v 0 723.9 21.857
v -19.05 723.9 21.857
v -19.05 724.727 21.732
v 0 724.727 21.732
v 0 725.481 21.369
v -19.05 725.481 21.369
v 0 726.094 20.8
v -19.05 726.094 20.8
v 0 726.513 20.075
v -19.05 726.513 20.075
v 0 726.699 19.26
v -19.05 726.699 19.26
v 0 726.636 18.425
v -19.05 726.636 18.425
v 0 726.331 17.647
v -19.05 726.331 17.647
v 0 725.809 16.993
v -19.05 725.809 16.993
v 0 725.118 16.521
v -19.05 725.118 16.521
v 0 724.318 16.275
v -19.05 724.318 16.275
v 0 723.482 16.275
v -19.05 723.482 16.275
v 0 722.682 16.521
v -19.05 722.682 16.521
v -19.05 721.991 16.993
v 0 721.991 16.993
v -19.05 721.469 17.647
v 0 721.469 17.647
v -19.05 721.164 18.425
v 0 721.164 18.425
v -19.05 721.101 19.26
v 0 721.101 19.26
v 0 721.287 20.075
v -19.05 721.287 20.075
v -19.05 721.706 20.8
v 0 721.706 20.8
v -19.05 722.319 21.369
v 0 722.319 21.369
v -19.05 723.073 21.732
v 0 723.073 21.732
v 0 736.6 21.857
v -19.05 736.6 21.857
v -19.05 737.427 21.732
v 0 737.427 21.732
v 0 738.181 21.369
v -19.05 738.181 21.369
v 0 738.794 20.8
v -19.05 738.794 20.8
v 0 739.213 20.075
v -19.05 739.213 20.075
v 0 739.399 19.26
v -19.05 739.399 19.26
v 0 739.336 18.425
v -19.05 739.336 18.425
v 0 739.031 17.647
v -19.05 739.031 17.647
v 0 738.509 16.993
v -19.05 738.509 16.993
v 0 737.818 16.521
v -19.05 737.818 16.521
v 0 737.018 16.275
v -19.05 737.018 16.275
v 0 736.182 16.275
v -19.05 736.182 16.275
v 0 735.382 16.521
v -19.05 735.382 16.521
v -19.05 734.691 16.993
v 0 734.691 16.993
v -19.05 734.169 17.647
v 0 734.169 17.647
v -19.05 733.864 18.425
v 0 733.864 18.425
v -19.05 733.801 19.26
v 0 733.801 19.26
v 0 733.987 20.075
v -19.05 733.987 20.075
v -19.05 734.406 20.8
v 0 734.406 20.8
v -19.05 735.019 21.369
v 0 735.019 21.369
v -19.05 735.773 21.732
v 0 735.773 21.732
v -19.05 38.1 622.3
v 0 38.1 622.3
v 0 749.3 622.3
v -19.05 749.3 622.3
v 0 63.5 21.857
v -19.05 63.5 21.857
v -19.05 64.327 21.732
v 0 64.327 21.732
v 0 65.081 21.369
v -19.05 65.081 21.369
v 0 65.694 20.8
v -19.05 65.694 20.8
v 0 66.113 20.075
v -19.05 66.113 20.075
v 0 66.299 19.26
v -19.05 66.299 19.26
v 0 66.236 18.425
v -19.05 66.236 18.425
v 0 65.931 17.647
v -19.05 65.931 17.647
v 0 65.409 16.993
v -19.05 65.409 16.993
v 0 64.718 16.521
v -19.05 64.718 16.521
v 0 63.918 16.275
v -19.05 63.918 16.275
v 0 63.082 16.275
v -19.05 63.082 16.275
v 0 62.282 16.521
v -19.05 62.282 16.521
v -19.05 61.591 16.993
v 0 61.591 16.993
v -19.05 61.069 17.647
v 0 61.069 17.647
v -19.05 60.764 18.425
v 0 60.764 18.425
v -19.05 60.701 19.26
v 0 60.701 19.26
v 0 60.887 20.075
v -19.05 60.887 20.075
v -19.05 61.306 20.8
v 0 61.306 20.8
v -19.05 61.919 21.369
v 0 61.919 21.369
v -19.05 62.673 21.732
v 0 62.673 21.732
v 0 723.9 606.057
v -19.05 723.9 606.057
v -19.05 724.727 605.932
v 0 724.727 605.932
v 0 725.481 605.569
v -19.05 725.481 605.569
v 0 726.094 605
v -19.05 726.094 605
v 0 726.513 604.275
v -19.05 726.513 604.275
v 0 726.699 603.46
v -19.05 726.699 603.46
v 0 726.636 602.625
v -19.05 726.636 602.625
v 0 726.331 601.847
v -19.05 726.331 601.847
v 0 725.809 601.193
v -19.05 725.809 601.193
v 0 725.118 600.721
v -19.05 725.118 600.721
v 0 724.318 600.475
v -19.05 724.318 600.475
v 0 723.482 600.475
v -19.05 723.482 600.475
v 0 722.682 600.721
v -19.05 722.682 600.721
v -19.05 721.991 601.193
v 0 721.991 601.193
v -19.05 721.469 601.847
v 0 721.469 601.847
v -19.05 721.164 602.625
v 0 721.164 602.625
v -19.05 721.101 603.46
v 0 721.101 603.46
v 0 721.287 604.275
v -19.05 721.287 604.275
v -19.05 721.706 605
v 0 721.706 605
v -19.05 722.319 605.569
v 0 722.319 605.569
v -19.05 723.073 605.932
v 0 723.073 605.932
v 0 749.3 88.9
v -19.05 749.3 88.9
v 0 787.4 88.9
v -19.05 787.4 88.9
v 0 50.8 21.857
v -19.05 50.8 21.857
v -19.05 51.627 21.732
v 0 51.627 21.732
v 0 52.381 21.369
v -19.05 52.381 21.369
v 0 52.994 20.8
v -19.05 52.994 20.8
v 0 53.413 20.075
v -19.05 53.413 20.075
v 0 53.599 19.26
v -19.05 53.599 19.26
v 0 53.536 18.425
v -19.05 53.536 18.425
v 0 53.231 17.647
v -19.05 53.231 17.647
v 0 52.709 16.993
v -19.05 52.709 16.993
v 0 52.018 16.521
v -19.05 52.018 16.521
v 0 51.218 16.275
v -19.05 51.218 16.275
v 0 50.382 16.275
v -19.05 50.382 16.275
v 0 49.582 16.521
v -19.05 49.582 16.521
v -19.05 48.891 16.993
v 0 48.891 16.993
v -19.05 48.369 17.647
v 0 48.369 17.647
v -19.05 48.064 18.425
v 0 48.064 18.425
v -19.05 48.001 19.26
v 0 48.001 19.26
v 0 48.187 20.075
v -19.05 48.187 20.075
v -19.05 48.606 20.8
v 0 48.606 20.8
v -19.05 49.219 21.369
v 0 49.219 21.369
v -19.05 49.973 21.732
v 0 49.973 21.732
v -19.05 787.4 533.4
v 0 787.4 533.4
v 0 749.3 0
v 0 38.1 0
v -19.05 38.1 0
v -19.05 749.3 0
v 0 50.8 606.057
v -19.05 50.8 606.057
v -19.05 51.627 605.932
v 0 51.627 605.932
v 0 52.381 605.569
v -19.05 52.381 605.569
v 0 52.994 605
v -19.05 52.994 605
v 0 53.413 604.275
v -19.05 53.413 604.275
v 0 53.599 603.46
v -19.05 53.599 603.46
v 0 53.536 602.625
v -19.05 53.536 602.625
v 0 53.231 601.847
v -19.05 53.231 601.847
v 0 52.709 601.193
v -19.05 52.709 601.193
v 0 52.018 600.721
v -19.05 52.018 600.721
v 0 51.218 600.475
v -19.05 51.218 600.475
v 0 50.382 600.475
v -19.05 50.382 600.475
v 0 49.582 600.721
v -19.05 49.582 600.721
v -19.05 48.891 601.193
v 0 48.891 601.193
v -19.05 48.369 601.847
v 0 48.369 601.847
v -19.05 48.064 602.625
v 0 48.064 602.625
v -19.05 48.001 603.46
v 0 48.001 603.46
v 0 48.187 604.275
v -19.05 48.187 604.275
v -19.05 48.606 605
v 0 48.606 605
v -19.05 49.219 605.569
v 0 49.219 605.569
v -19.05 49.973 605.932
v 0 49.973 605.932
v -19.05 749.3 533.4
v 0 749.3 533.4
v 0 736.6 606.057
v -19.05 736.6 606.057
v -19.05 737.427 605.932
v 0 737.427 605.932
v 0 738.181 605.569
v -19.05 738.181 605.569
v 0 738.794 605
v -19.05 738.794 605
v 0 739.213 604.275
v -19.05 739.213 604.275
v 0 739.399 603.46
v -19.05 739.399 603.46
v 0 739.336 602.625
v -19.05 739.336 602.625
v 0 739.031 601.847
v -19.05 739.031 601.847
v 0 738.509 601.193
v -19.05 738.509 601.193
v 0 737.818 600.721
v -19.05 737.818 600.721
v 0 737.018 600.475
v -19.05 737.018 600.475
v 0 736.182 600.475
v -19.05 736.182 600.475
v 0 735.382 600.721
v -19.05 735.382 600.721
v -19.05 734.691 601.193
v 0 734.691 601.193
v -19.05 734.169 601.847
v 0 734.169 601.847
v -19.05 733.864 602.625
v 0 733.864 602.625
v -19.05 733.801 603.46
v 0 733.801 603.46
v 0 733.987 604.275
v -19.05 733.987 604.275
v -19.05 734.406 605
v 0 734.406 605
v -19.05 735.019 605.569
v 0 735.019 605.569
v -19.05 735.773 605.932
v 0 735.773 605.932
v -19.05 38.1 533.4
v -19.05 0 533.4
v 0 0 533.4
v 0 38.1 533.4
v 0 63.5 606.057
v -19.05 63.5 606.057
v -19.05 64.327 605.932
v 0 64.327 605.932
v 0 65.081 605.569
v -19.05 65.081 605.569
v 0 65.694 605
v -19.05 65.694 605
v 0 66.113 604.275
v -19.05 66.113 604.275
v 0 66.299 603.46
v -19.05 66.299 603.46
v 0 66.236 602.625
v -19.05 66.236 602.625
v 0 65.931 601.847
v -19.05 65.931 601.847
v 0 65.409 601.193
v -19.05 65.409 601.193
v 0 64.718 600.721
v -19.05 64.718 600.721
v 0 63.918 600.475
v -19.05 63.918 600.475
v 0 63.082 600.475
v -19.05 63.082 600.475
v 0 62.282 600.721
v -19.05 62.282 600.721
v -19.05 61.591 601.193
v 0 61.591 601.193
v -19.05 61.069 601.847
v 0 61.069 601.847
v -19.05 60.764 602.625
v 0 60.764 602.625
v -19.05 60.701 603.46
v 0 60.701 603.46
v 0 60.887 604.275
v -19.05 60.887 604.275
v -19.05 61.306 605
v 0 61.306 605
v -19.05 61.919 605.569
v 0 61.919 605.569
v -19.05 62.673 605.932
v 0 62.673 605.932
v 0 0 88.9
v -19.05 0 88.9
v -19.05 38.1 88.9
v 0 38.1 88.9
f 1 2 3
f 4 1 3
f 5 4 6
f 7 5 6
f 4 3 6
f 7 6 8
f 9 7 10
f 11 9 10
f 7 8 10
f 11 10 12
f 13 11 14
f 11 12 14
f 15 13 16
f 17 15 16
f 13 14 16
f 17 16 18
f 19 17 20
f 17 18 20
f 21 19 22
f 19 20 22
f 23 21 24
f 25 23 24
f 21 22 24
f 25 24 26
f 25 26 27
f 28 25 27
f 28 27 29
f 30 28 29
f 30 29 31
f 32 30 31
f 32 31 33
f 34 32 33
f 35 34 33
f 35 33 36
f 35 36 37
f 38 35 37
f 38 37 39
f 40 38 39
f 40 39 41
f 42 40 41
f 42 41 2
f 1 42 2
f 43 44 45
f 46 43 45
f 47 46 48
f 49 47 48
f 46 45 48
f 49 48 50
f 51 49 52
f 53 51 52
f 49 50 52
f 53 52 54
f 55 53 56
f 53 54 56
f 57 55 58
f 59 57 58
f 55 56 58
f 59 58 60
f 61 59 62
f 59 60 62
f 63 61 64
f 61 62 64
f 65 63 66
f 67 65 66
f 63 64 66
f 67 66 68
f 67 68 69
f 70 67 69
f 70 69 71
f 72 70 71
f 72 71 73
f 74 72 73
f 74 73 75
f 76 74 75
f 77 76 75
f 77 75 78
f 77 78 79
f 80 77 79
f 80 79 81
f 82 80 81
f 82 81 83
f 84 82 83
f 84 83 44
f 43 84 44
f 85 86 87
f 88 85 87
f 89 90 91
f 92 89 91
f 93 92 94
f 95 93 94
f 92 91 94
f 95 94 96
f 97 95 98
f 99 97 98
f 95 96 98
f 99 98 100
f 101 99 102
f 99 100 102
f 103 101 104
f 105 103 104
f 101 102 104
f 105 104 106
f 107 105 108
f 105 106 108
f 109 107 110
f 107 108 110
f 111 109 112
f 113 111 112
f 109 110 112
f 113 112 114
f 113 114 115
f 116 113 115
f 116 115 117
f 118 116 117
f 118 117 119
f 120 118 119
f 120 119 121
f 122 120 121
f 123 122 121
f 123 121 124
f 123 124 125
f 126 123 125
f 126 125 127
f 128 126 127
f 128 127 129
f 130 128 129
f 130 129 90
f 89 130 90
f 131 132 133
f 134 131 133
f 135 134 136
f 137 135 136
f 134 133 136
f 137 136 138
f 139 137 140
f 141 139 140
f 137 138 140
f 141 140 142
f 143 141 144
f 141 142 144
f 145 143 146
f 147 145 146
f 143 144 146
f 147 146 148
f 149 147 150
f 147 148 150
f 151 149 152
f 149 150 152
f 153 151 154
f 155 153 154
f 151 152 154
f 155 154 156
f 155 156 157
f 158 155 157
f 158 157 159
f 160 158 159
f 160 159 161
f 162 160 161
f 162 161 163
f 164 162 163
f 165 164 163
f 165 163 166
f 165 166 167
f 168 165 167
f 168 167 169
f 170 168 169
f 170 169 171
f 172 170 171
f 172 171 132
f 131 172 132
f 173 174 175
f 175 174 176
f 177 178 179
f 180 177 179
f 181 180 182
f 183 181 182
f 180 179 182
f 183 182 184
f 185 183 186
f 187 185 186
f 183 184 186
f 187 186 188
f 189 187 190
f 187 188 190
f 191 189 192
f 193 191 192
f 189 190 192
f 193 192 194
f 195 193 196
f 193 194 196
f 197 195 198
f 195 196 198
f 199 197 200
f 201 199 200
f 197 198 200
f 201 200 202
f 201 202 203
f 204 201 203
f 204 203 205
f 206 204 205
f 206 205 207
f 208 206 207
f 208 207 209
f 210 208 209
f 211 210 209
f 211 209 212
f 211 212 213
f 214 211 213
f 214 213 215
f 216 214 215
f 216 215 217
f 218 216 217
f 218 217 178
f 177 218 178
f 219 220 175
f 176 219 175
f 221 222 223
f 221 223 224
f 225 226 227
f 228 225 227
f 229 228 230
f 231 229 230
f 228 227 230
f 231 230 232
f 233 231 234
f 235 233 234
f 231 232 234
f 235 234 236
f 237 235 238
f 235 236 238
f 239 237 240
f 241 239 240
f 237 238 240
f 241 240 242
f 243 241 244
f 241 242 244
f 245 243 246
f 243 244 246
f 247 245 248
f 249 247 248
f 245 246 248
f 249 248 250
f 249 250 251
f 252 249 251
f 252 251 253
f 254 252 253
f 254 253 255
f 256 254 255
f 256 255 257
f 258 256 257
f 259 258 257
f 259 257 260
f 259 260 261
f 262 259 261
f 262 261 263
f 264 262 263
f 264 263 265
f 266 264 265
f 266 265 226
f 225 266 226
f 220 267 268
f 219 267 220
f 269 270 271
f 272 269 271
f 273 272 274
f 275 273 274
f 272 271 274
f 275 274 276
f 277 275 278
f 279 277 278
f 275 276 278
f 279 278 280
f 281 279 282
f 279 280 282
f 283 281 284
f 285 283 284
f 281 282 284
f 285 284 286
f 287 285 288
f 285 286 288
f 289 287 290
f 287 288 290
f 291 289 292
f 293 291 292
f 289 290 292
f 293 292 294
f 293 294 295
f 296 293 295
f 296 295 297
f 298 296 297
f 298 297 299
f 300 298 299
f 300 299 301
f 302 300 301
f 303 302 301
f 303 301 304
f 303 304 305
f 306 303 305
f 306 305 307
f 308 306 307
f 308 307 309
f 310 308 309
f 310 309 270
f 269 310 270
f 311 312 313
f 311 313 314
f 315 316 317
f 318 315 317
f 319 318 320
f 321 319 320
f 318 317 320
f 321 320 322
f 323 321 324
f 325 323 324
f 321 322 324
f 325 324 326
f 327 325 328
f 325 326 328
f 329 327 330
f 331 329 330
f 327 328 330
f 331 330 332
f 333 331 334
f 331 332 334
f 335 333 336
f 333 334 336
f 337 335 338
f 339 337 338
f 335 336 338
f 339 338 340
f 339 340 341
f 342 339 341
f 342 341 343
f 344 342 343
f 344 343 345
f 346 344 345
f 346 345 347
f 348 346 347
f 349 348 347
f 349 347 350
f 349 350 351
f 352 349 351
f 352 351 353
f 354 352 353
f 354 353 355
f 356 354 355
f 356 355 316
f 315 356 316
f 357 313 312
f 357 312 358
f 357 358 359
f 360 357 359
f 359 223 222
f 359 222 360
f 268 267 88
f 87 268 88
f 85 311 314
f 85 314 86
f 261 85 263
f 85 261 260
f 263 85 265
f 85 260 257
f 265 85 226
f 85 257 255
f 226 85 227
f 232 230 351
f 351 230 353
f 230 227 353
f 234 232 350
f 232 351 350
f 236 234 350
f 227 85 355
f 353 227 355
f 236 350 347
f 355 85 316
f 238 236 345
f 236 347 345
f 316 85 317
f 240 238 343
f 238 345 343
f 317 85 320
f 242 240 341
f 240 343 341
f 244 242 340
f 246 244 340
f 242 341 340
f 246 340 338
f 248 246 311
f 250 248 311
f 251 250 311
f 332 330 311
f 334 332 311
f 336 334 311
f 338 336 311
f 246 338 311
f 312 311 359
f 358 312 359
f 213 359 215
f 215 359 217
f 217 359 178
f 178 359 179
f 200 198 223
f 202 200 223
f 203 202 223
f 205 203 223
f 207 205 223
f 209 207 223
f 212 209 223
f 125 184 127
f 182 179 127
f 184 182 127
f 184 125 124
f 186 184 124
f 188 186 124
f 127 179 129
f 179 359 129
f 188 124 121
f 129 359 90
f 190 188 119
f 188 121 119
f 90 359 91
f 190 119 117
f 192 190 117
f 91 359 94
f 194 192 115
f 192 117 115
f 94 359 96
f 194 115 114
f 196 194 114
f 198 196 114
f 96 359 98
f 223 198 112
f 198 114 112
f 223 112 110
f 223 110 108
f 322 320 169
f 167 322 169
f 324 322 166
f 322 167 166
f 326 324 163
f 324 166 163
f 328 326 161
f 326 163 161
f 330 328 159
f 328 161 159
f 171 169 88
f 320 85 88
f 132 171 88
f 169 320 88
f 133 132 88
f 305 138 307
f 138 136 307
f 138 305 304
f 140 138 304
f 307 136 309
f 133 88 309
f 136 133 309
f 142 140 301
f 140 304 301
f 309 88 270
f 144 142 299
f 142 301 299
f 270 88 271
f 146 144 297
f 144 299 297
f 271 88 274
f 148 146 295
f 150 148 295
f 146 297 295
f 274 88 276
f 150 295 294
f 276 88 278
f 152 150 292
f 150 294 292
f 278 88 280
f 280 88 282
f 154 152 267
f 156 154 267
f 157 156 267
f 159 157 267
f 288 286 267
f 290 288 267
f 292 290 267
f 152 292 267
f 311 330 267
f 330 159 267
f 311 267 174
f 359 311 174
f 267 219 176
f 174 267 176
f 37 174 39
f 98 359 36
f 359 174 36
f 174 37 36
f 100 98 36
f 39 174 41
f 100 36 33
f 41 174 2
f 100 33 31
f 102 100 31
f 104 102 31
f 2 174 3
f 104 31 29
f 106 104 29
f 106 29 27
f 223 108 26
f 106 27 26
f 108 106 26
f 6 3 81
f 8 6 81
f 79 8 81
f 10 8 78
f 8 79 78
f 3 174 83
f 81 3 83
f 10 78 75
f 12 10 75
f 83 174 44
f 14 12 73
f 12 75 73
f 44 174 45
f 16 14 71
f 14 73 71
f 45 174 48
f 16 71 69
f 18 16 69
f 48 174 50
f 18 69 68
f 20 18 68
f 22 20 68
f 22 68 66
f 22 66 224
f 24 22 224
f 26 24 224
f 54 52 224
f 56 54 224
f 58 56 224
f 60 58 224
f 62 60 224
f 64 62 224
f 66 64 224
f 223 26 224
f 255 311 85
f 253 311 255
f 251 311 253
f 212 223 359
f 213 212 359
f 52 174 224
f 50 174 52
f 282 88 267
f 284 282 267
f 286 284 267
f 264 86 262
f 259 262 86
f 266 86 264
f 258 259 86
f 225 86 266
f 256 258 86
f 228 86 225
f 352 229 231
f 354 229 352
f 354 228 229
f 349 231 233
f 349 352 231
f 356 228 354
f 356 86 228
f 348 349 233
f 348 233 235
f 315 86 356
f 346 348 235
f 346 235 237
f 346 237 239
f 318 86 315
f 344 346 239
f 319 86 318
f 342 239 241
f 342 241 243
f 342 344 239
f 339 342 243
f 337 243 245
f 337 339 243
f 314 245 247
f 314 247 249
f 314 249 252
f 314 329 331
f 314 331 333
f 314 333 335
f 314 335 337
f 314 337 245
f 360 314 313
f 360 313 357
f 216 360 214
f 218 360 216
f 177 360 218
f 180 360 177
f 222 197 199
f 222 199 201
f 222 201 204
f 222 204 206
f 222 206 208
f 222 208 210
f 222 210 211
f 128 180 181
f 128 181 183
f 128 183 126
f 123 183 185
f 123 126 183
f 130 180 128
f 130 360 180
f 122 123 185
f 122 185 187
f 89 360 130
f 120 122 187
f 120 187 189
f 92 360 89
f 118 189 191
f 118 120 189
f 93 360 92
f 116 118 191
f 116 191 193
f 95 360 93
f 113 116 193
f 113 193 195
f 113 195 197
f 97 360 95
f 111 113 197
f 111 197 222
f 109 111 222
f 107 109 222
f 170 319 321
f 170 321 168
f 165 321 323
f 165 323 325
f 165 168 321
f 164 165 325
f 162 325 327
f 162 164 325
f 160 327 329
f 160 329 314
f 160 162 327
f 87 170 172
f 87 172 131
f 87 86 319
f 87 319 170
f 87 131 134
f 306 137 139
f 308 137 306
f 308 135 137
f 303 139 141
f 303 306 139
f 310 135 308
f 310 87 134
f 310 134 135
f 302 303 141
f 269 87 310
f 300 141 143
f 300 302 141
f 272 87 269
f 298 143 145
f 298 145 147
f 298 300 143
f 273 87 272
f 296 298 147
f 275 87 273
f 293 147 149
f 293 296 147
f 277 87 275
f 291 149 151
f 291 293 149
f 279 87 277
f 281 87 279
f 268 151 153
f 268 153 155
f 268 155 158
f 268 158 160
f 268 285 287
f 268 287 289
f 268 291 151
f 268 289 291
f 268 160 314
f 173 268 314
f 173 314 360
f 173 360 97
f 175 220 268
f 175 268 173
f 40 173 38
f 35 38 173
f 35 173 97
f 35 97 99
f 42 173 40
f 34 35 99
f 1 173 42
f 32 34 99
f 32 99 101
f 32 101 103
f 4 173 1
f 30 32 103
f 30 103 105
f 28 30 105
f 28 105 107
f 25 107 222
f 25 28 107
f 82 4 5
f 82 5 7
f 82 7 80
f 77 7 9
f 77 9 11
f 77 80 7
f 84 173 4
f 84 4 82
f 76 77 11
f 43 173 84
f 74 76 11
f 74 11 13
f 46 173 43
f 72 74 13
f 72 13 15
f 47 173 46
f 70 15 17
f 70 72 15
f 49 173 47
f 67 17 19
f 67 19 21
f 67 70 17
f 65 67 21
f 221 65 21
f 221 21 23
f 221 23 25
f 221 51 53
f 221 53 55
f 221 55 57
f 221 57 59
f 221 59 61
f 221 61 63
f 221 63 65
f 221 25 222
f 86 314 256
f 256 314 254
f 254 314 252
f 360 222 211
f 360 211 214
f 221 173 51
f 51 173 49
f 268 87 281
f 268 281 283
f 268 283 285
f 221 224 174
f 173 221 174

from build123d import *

# Parameters (mm, degrees)
SKETCH1_W              = 622.3
SKETCH1_H              = 787.4
BOSS_EXTRUDE1_DEPTH    = 19.05
SKETCH2_W              = 88.9
SKETCH2_H              = 38.1
CUT_EXTRUDE1_DEPTH     = 1004.802247706
F_10_CLEARANCE_HOLE6_D = 5.6134


with BuildPart() as part:
    # Sketch1 → Boss-Extrude1 (new body)
    with BuildSketch(Plane(origin=(0, 0, 0), x_dir=(0, 0, -1), z_dir=(1, 0, 0))):
        with Locations((-311.15, 393.7)):
            Rectangle(SKETCH1_W, SKETCH1_H)
    extrude(amount=-BOSS_EXTRUDE1_DEPTH)

    # Sketch2 → Cut-Extrude1 (cut, through all)
    with BuildSketch(Plane.ZY.offset(19.05)):
        with Locations((44.45, 768.35)):
            Rectangle(SKETCH2_W, SKETCH2_H)
        with Locations((577.85, 768.35)):
            Rectangle(SKETCH2_W, SKETCH2_H)
        with Locations((577.85, 19.05)):
            Rectangle(SKETCH2_W, SKETCH2_H)
        with Locations((44.45, 19.05)):
            Rectangle(SKETCH2_W, SKETCH2_H)
    extrude(amount=-CUT_EXTRUDE1_DEPTH, mode=Mode.SUBTRACT)

    # #10 Clearance Hole6 (through all)
    with Locations(Plane(origin=(0, 0, 0), x_dir=(0, 0, -1), z_dir=(1, 0, 0))):
        with Locations((-603.25, 50.8), (-603.25, 63.5), (-19.05, 50.8), (-19.05, 63.5), (-19.05, 723.9), (-19.05, 736.6), (-603.25, 723.9), (-603.25, 736.6)):
            Hole(F_10_CLEARANCE_HOLE6_D / 2)


solid = part.part
